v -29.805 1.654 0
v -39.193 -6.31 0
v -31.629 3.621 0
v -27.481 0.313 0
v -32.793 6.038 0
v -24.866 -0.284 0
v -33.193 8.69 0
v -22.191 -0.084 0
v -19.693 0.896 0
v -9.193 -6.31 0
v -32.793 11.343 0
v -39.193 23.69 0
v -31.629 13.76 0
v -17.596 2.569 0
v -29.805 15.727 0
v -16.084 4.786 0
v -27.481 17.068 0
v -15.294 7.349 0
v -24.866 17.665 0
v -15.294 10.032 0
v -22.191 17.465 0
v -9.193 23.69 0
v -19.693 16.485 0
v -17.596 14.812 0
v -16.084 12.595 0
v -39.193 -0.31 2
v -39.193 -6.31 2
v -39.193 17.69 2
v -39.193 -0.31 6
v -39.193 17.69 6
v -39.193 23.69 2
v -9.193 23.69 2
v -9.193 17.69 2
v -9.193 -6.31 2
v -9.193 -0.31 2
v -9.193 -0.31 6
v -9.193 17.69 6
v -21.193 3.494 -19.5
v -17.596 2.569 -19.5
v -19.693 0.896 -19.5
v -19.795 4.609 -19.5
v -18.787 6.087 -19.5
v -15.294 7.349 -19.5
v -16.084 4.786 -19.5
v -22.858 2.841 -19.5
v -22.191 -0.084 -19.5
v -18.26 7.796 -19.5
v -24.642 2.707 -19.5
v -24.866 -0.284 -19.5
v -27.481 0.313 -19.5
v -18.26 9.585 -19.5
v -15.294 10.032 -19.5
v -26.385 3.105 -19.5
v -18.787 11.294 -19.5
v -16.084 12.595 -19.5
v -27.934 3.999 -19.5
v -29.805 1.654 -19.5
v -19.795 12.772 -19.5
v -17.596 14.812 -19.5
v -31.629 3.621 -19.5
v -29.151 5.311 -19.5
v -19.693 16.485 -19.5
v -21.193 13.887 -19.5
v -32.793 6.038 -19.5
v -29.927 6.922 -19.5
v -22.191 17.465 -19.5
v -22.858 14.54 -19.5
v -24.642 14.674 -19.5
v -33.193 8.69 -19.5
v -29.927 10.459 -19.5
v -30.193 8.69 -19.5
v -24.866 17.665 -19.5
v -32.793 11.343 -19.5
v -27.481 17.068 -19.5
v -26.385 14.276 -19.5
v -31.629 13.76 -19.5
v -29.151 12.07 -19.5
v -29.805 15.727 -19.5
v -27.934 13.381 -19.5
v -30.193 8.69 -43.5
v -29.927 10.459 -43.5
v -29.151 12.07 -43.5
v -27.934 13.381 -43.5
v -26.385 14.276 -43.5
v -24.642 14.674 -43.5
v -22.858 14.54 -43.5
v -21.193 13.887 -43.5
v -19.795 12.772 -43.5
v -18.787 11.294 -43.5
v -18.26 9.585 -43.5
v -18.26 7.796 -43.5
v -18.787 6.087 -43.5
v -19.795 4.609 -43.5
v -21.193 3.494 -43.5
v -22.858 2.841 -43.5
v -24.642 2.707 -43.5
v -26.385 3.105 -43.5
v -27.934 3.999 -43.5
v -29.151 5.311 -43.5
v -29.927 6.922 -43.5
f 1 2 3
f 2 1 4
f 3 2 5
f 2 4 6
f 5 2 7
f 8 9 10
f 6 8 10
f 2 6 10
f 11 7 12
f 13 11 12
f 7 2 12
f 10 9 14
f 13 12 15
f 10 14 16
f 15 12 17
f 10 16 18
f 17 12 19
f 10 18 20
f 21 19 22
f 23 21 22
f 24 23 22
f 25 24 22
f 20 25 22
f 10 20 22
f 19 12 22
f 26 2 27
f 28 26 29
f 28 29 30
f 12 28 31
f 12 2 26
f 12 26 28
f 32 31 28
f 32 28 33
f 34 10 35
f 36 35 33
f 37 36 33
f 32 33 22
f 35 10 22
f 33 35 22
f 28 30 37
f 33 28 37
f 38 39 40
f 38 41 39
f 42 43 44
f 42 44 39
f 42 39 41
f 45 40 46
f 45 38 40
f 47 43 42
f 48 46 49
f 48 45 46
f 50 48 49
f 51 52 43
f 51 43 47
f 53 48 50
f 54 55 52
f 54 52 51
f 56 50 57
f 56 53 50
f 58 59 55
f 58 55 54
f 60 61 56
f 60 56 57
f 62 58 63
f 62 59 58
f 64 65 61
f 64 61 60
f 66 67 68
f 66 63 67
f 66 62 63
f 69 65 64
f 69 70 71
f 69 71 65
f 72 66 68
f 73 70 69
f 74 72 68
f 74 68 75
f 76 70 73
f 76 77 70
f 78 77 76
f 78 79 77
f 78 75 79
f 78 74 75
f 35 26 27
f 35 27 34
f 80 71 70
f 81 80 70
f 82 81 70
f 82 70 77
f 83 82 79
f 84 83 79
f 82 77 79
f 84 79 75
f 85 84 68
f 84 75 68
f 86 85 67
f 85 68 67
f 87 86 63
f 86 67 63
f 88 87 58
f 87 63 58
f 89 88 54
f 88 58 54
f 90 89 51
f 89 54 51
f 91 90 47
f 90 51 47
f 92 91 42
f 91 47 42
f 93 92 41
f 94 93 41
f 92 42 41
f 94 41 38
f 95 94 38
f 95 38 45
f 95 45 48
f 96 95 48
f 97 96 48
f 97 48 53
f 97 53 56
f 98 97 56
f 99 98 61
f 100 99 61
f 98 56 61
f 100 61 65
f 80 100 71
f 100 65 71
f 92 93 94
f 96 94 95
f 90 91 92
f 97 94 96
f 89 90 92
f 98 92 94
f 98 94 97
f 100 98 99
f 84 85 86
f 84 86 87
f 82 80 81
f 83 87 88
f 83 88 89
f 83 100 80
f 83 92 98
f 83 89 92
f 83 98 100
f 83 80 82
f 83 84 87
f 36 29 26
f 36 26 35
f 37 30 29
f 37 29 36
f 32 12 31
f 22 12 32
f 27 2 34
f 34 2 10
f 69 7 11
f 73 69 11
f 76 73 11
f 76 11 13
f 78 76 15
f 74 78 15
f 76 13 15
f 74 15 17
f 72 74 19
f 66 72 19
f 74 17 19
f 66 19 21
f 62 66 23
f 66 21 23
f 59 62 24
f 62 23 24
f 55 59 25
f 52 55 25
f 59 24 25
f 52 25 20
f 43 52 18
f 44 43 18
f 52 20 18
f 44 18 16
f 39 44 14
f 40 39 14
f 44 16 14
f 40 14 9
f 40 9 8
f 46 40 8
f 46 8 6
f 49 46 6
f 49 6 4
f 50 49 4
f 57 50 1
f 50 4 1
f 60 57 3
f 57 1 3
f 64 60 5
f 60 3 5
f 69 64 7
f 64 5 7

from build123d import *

# Parameters (mm, degrees)
IZIM1_W                     = 30
IZIM1_H                     = 30
Y_KSEKLIK_EKSTR_ZYON1_DEPTH = 6
IZIM2_W                     = 30
IZIM2_H                     = 6
KES_EKSTR_ZYON1_DEPTH       = 4
IZIM3_W                     = 30
IZIM3_H                     = 6
KES_EKSTR_ZYON2_DEPTH       = 4
IZIM4_R                     = 9
Y_KSEKLIK_EKSTR_ZYON2_DEPTH = 19.5
IZIM5_R                     = 6
Y_KSEKLIK_EKSTR_ZYON3_DEPTH = 24


with BuildPart() as part:
    # Çizim1 → Yükseklik-Ekstrüzyon1 (new body)
    with BuildSketch(Plane.XY):
        with Locations((-24.193211068, 8.69047619)):
            Rectangle(IZIM1_W, IZIM1_H)
    extrude(amount=Y_KSEKLIK_EKSTR_ZYON1_DEPTH)

    # Çizim2 → Kes-Ekstrüzyon1 (cut)
    with BuildSketch(Plane.XY.offset(6)):
        with Locations((-24.193211068, -3.30952381)):
            Rectangle(IZIM2_W, IZIM2_H)
    extrude(amount=-KES_EKSTR_ZYON1_DEPTH, mode=Mode.SUBTRACT)

    # Çizim3 → Kes-Ekstrüzyon2 (cut)
    with BuildSketch(Plane.XY.offset(6)):
        with Locations((-24.193211068, 20.69047619)):
            Rectangle(IZIM3_W, IZIM3_H)
    extrude(amount=-KES_EKSTR_ZYON2_DEPTH, mode=Mode.SUBTRACT)

    # Çizim4 → Yükseklik-Ekstrüzyon2 (add)
    with BuildSketch(Plane(origin=(0, 0, 0), x_dir=(-1, 0, 0), z_dir=(0, 0, -1))):
        with Locations((24.193211068, 8.69047619)):
            Circle(IZIM4_R)
    extrude(amount=Y_KSEKLIK_EKSTR_ZYON2_DEPTH)

    # Çizim5 → Yükseklik-Ekstrüzyon3 (add)
    with BuildSketch(Plane(origin=(0, 0, -19.5), x_dir=(-1, 0, 0), z_dir=(0, 0, -1))):
        with Locations((24.193211068, 8.69047619)):
            Circle(IZIM5_R)
    extrude(amount=Y_KSEKLIK_EKSTR_ZYON3_DEPTH)


solid = part.part
